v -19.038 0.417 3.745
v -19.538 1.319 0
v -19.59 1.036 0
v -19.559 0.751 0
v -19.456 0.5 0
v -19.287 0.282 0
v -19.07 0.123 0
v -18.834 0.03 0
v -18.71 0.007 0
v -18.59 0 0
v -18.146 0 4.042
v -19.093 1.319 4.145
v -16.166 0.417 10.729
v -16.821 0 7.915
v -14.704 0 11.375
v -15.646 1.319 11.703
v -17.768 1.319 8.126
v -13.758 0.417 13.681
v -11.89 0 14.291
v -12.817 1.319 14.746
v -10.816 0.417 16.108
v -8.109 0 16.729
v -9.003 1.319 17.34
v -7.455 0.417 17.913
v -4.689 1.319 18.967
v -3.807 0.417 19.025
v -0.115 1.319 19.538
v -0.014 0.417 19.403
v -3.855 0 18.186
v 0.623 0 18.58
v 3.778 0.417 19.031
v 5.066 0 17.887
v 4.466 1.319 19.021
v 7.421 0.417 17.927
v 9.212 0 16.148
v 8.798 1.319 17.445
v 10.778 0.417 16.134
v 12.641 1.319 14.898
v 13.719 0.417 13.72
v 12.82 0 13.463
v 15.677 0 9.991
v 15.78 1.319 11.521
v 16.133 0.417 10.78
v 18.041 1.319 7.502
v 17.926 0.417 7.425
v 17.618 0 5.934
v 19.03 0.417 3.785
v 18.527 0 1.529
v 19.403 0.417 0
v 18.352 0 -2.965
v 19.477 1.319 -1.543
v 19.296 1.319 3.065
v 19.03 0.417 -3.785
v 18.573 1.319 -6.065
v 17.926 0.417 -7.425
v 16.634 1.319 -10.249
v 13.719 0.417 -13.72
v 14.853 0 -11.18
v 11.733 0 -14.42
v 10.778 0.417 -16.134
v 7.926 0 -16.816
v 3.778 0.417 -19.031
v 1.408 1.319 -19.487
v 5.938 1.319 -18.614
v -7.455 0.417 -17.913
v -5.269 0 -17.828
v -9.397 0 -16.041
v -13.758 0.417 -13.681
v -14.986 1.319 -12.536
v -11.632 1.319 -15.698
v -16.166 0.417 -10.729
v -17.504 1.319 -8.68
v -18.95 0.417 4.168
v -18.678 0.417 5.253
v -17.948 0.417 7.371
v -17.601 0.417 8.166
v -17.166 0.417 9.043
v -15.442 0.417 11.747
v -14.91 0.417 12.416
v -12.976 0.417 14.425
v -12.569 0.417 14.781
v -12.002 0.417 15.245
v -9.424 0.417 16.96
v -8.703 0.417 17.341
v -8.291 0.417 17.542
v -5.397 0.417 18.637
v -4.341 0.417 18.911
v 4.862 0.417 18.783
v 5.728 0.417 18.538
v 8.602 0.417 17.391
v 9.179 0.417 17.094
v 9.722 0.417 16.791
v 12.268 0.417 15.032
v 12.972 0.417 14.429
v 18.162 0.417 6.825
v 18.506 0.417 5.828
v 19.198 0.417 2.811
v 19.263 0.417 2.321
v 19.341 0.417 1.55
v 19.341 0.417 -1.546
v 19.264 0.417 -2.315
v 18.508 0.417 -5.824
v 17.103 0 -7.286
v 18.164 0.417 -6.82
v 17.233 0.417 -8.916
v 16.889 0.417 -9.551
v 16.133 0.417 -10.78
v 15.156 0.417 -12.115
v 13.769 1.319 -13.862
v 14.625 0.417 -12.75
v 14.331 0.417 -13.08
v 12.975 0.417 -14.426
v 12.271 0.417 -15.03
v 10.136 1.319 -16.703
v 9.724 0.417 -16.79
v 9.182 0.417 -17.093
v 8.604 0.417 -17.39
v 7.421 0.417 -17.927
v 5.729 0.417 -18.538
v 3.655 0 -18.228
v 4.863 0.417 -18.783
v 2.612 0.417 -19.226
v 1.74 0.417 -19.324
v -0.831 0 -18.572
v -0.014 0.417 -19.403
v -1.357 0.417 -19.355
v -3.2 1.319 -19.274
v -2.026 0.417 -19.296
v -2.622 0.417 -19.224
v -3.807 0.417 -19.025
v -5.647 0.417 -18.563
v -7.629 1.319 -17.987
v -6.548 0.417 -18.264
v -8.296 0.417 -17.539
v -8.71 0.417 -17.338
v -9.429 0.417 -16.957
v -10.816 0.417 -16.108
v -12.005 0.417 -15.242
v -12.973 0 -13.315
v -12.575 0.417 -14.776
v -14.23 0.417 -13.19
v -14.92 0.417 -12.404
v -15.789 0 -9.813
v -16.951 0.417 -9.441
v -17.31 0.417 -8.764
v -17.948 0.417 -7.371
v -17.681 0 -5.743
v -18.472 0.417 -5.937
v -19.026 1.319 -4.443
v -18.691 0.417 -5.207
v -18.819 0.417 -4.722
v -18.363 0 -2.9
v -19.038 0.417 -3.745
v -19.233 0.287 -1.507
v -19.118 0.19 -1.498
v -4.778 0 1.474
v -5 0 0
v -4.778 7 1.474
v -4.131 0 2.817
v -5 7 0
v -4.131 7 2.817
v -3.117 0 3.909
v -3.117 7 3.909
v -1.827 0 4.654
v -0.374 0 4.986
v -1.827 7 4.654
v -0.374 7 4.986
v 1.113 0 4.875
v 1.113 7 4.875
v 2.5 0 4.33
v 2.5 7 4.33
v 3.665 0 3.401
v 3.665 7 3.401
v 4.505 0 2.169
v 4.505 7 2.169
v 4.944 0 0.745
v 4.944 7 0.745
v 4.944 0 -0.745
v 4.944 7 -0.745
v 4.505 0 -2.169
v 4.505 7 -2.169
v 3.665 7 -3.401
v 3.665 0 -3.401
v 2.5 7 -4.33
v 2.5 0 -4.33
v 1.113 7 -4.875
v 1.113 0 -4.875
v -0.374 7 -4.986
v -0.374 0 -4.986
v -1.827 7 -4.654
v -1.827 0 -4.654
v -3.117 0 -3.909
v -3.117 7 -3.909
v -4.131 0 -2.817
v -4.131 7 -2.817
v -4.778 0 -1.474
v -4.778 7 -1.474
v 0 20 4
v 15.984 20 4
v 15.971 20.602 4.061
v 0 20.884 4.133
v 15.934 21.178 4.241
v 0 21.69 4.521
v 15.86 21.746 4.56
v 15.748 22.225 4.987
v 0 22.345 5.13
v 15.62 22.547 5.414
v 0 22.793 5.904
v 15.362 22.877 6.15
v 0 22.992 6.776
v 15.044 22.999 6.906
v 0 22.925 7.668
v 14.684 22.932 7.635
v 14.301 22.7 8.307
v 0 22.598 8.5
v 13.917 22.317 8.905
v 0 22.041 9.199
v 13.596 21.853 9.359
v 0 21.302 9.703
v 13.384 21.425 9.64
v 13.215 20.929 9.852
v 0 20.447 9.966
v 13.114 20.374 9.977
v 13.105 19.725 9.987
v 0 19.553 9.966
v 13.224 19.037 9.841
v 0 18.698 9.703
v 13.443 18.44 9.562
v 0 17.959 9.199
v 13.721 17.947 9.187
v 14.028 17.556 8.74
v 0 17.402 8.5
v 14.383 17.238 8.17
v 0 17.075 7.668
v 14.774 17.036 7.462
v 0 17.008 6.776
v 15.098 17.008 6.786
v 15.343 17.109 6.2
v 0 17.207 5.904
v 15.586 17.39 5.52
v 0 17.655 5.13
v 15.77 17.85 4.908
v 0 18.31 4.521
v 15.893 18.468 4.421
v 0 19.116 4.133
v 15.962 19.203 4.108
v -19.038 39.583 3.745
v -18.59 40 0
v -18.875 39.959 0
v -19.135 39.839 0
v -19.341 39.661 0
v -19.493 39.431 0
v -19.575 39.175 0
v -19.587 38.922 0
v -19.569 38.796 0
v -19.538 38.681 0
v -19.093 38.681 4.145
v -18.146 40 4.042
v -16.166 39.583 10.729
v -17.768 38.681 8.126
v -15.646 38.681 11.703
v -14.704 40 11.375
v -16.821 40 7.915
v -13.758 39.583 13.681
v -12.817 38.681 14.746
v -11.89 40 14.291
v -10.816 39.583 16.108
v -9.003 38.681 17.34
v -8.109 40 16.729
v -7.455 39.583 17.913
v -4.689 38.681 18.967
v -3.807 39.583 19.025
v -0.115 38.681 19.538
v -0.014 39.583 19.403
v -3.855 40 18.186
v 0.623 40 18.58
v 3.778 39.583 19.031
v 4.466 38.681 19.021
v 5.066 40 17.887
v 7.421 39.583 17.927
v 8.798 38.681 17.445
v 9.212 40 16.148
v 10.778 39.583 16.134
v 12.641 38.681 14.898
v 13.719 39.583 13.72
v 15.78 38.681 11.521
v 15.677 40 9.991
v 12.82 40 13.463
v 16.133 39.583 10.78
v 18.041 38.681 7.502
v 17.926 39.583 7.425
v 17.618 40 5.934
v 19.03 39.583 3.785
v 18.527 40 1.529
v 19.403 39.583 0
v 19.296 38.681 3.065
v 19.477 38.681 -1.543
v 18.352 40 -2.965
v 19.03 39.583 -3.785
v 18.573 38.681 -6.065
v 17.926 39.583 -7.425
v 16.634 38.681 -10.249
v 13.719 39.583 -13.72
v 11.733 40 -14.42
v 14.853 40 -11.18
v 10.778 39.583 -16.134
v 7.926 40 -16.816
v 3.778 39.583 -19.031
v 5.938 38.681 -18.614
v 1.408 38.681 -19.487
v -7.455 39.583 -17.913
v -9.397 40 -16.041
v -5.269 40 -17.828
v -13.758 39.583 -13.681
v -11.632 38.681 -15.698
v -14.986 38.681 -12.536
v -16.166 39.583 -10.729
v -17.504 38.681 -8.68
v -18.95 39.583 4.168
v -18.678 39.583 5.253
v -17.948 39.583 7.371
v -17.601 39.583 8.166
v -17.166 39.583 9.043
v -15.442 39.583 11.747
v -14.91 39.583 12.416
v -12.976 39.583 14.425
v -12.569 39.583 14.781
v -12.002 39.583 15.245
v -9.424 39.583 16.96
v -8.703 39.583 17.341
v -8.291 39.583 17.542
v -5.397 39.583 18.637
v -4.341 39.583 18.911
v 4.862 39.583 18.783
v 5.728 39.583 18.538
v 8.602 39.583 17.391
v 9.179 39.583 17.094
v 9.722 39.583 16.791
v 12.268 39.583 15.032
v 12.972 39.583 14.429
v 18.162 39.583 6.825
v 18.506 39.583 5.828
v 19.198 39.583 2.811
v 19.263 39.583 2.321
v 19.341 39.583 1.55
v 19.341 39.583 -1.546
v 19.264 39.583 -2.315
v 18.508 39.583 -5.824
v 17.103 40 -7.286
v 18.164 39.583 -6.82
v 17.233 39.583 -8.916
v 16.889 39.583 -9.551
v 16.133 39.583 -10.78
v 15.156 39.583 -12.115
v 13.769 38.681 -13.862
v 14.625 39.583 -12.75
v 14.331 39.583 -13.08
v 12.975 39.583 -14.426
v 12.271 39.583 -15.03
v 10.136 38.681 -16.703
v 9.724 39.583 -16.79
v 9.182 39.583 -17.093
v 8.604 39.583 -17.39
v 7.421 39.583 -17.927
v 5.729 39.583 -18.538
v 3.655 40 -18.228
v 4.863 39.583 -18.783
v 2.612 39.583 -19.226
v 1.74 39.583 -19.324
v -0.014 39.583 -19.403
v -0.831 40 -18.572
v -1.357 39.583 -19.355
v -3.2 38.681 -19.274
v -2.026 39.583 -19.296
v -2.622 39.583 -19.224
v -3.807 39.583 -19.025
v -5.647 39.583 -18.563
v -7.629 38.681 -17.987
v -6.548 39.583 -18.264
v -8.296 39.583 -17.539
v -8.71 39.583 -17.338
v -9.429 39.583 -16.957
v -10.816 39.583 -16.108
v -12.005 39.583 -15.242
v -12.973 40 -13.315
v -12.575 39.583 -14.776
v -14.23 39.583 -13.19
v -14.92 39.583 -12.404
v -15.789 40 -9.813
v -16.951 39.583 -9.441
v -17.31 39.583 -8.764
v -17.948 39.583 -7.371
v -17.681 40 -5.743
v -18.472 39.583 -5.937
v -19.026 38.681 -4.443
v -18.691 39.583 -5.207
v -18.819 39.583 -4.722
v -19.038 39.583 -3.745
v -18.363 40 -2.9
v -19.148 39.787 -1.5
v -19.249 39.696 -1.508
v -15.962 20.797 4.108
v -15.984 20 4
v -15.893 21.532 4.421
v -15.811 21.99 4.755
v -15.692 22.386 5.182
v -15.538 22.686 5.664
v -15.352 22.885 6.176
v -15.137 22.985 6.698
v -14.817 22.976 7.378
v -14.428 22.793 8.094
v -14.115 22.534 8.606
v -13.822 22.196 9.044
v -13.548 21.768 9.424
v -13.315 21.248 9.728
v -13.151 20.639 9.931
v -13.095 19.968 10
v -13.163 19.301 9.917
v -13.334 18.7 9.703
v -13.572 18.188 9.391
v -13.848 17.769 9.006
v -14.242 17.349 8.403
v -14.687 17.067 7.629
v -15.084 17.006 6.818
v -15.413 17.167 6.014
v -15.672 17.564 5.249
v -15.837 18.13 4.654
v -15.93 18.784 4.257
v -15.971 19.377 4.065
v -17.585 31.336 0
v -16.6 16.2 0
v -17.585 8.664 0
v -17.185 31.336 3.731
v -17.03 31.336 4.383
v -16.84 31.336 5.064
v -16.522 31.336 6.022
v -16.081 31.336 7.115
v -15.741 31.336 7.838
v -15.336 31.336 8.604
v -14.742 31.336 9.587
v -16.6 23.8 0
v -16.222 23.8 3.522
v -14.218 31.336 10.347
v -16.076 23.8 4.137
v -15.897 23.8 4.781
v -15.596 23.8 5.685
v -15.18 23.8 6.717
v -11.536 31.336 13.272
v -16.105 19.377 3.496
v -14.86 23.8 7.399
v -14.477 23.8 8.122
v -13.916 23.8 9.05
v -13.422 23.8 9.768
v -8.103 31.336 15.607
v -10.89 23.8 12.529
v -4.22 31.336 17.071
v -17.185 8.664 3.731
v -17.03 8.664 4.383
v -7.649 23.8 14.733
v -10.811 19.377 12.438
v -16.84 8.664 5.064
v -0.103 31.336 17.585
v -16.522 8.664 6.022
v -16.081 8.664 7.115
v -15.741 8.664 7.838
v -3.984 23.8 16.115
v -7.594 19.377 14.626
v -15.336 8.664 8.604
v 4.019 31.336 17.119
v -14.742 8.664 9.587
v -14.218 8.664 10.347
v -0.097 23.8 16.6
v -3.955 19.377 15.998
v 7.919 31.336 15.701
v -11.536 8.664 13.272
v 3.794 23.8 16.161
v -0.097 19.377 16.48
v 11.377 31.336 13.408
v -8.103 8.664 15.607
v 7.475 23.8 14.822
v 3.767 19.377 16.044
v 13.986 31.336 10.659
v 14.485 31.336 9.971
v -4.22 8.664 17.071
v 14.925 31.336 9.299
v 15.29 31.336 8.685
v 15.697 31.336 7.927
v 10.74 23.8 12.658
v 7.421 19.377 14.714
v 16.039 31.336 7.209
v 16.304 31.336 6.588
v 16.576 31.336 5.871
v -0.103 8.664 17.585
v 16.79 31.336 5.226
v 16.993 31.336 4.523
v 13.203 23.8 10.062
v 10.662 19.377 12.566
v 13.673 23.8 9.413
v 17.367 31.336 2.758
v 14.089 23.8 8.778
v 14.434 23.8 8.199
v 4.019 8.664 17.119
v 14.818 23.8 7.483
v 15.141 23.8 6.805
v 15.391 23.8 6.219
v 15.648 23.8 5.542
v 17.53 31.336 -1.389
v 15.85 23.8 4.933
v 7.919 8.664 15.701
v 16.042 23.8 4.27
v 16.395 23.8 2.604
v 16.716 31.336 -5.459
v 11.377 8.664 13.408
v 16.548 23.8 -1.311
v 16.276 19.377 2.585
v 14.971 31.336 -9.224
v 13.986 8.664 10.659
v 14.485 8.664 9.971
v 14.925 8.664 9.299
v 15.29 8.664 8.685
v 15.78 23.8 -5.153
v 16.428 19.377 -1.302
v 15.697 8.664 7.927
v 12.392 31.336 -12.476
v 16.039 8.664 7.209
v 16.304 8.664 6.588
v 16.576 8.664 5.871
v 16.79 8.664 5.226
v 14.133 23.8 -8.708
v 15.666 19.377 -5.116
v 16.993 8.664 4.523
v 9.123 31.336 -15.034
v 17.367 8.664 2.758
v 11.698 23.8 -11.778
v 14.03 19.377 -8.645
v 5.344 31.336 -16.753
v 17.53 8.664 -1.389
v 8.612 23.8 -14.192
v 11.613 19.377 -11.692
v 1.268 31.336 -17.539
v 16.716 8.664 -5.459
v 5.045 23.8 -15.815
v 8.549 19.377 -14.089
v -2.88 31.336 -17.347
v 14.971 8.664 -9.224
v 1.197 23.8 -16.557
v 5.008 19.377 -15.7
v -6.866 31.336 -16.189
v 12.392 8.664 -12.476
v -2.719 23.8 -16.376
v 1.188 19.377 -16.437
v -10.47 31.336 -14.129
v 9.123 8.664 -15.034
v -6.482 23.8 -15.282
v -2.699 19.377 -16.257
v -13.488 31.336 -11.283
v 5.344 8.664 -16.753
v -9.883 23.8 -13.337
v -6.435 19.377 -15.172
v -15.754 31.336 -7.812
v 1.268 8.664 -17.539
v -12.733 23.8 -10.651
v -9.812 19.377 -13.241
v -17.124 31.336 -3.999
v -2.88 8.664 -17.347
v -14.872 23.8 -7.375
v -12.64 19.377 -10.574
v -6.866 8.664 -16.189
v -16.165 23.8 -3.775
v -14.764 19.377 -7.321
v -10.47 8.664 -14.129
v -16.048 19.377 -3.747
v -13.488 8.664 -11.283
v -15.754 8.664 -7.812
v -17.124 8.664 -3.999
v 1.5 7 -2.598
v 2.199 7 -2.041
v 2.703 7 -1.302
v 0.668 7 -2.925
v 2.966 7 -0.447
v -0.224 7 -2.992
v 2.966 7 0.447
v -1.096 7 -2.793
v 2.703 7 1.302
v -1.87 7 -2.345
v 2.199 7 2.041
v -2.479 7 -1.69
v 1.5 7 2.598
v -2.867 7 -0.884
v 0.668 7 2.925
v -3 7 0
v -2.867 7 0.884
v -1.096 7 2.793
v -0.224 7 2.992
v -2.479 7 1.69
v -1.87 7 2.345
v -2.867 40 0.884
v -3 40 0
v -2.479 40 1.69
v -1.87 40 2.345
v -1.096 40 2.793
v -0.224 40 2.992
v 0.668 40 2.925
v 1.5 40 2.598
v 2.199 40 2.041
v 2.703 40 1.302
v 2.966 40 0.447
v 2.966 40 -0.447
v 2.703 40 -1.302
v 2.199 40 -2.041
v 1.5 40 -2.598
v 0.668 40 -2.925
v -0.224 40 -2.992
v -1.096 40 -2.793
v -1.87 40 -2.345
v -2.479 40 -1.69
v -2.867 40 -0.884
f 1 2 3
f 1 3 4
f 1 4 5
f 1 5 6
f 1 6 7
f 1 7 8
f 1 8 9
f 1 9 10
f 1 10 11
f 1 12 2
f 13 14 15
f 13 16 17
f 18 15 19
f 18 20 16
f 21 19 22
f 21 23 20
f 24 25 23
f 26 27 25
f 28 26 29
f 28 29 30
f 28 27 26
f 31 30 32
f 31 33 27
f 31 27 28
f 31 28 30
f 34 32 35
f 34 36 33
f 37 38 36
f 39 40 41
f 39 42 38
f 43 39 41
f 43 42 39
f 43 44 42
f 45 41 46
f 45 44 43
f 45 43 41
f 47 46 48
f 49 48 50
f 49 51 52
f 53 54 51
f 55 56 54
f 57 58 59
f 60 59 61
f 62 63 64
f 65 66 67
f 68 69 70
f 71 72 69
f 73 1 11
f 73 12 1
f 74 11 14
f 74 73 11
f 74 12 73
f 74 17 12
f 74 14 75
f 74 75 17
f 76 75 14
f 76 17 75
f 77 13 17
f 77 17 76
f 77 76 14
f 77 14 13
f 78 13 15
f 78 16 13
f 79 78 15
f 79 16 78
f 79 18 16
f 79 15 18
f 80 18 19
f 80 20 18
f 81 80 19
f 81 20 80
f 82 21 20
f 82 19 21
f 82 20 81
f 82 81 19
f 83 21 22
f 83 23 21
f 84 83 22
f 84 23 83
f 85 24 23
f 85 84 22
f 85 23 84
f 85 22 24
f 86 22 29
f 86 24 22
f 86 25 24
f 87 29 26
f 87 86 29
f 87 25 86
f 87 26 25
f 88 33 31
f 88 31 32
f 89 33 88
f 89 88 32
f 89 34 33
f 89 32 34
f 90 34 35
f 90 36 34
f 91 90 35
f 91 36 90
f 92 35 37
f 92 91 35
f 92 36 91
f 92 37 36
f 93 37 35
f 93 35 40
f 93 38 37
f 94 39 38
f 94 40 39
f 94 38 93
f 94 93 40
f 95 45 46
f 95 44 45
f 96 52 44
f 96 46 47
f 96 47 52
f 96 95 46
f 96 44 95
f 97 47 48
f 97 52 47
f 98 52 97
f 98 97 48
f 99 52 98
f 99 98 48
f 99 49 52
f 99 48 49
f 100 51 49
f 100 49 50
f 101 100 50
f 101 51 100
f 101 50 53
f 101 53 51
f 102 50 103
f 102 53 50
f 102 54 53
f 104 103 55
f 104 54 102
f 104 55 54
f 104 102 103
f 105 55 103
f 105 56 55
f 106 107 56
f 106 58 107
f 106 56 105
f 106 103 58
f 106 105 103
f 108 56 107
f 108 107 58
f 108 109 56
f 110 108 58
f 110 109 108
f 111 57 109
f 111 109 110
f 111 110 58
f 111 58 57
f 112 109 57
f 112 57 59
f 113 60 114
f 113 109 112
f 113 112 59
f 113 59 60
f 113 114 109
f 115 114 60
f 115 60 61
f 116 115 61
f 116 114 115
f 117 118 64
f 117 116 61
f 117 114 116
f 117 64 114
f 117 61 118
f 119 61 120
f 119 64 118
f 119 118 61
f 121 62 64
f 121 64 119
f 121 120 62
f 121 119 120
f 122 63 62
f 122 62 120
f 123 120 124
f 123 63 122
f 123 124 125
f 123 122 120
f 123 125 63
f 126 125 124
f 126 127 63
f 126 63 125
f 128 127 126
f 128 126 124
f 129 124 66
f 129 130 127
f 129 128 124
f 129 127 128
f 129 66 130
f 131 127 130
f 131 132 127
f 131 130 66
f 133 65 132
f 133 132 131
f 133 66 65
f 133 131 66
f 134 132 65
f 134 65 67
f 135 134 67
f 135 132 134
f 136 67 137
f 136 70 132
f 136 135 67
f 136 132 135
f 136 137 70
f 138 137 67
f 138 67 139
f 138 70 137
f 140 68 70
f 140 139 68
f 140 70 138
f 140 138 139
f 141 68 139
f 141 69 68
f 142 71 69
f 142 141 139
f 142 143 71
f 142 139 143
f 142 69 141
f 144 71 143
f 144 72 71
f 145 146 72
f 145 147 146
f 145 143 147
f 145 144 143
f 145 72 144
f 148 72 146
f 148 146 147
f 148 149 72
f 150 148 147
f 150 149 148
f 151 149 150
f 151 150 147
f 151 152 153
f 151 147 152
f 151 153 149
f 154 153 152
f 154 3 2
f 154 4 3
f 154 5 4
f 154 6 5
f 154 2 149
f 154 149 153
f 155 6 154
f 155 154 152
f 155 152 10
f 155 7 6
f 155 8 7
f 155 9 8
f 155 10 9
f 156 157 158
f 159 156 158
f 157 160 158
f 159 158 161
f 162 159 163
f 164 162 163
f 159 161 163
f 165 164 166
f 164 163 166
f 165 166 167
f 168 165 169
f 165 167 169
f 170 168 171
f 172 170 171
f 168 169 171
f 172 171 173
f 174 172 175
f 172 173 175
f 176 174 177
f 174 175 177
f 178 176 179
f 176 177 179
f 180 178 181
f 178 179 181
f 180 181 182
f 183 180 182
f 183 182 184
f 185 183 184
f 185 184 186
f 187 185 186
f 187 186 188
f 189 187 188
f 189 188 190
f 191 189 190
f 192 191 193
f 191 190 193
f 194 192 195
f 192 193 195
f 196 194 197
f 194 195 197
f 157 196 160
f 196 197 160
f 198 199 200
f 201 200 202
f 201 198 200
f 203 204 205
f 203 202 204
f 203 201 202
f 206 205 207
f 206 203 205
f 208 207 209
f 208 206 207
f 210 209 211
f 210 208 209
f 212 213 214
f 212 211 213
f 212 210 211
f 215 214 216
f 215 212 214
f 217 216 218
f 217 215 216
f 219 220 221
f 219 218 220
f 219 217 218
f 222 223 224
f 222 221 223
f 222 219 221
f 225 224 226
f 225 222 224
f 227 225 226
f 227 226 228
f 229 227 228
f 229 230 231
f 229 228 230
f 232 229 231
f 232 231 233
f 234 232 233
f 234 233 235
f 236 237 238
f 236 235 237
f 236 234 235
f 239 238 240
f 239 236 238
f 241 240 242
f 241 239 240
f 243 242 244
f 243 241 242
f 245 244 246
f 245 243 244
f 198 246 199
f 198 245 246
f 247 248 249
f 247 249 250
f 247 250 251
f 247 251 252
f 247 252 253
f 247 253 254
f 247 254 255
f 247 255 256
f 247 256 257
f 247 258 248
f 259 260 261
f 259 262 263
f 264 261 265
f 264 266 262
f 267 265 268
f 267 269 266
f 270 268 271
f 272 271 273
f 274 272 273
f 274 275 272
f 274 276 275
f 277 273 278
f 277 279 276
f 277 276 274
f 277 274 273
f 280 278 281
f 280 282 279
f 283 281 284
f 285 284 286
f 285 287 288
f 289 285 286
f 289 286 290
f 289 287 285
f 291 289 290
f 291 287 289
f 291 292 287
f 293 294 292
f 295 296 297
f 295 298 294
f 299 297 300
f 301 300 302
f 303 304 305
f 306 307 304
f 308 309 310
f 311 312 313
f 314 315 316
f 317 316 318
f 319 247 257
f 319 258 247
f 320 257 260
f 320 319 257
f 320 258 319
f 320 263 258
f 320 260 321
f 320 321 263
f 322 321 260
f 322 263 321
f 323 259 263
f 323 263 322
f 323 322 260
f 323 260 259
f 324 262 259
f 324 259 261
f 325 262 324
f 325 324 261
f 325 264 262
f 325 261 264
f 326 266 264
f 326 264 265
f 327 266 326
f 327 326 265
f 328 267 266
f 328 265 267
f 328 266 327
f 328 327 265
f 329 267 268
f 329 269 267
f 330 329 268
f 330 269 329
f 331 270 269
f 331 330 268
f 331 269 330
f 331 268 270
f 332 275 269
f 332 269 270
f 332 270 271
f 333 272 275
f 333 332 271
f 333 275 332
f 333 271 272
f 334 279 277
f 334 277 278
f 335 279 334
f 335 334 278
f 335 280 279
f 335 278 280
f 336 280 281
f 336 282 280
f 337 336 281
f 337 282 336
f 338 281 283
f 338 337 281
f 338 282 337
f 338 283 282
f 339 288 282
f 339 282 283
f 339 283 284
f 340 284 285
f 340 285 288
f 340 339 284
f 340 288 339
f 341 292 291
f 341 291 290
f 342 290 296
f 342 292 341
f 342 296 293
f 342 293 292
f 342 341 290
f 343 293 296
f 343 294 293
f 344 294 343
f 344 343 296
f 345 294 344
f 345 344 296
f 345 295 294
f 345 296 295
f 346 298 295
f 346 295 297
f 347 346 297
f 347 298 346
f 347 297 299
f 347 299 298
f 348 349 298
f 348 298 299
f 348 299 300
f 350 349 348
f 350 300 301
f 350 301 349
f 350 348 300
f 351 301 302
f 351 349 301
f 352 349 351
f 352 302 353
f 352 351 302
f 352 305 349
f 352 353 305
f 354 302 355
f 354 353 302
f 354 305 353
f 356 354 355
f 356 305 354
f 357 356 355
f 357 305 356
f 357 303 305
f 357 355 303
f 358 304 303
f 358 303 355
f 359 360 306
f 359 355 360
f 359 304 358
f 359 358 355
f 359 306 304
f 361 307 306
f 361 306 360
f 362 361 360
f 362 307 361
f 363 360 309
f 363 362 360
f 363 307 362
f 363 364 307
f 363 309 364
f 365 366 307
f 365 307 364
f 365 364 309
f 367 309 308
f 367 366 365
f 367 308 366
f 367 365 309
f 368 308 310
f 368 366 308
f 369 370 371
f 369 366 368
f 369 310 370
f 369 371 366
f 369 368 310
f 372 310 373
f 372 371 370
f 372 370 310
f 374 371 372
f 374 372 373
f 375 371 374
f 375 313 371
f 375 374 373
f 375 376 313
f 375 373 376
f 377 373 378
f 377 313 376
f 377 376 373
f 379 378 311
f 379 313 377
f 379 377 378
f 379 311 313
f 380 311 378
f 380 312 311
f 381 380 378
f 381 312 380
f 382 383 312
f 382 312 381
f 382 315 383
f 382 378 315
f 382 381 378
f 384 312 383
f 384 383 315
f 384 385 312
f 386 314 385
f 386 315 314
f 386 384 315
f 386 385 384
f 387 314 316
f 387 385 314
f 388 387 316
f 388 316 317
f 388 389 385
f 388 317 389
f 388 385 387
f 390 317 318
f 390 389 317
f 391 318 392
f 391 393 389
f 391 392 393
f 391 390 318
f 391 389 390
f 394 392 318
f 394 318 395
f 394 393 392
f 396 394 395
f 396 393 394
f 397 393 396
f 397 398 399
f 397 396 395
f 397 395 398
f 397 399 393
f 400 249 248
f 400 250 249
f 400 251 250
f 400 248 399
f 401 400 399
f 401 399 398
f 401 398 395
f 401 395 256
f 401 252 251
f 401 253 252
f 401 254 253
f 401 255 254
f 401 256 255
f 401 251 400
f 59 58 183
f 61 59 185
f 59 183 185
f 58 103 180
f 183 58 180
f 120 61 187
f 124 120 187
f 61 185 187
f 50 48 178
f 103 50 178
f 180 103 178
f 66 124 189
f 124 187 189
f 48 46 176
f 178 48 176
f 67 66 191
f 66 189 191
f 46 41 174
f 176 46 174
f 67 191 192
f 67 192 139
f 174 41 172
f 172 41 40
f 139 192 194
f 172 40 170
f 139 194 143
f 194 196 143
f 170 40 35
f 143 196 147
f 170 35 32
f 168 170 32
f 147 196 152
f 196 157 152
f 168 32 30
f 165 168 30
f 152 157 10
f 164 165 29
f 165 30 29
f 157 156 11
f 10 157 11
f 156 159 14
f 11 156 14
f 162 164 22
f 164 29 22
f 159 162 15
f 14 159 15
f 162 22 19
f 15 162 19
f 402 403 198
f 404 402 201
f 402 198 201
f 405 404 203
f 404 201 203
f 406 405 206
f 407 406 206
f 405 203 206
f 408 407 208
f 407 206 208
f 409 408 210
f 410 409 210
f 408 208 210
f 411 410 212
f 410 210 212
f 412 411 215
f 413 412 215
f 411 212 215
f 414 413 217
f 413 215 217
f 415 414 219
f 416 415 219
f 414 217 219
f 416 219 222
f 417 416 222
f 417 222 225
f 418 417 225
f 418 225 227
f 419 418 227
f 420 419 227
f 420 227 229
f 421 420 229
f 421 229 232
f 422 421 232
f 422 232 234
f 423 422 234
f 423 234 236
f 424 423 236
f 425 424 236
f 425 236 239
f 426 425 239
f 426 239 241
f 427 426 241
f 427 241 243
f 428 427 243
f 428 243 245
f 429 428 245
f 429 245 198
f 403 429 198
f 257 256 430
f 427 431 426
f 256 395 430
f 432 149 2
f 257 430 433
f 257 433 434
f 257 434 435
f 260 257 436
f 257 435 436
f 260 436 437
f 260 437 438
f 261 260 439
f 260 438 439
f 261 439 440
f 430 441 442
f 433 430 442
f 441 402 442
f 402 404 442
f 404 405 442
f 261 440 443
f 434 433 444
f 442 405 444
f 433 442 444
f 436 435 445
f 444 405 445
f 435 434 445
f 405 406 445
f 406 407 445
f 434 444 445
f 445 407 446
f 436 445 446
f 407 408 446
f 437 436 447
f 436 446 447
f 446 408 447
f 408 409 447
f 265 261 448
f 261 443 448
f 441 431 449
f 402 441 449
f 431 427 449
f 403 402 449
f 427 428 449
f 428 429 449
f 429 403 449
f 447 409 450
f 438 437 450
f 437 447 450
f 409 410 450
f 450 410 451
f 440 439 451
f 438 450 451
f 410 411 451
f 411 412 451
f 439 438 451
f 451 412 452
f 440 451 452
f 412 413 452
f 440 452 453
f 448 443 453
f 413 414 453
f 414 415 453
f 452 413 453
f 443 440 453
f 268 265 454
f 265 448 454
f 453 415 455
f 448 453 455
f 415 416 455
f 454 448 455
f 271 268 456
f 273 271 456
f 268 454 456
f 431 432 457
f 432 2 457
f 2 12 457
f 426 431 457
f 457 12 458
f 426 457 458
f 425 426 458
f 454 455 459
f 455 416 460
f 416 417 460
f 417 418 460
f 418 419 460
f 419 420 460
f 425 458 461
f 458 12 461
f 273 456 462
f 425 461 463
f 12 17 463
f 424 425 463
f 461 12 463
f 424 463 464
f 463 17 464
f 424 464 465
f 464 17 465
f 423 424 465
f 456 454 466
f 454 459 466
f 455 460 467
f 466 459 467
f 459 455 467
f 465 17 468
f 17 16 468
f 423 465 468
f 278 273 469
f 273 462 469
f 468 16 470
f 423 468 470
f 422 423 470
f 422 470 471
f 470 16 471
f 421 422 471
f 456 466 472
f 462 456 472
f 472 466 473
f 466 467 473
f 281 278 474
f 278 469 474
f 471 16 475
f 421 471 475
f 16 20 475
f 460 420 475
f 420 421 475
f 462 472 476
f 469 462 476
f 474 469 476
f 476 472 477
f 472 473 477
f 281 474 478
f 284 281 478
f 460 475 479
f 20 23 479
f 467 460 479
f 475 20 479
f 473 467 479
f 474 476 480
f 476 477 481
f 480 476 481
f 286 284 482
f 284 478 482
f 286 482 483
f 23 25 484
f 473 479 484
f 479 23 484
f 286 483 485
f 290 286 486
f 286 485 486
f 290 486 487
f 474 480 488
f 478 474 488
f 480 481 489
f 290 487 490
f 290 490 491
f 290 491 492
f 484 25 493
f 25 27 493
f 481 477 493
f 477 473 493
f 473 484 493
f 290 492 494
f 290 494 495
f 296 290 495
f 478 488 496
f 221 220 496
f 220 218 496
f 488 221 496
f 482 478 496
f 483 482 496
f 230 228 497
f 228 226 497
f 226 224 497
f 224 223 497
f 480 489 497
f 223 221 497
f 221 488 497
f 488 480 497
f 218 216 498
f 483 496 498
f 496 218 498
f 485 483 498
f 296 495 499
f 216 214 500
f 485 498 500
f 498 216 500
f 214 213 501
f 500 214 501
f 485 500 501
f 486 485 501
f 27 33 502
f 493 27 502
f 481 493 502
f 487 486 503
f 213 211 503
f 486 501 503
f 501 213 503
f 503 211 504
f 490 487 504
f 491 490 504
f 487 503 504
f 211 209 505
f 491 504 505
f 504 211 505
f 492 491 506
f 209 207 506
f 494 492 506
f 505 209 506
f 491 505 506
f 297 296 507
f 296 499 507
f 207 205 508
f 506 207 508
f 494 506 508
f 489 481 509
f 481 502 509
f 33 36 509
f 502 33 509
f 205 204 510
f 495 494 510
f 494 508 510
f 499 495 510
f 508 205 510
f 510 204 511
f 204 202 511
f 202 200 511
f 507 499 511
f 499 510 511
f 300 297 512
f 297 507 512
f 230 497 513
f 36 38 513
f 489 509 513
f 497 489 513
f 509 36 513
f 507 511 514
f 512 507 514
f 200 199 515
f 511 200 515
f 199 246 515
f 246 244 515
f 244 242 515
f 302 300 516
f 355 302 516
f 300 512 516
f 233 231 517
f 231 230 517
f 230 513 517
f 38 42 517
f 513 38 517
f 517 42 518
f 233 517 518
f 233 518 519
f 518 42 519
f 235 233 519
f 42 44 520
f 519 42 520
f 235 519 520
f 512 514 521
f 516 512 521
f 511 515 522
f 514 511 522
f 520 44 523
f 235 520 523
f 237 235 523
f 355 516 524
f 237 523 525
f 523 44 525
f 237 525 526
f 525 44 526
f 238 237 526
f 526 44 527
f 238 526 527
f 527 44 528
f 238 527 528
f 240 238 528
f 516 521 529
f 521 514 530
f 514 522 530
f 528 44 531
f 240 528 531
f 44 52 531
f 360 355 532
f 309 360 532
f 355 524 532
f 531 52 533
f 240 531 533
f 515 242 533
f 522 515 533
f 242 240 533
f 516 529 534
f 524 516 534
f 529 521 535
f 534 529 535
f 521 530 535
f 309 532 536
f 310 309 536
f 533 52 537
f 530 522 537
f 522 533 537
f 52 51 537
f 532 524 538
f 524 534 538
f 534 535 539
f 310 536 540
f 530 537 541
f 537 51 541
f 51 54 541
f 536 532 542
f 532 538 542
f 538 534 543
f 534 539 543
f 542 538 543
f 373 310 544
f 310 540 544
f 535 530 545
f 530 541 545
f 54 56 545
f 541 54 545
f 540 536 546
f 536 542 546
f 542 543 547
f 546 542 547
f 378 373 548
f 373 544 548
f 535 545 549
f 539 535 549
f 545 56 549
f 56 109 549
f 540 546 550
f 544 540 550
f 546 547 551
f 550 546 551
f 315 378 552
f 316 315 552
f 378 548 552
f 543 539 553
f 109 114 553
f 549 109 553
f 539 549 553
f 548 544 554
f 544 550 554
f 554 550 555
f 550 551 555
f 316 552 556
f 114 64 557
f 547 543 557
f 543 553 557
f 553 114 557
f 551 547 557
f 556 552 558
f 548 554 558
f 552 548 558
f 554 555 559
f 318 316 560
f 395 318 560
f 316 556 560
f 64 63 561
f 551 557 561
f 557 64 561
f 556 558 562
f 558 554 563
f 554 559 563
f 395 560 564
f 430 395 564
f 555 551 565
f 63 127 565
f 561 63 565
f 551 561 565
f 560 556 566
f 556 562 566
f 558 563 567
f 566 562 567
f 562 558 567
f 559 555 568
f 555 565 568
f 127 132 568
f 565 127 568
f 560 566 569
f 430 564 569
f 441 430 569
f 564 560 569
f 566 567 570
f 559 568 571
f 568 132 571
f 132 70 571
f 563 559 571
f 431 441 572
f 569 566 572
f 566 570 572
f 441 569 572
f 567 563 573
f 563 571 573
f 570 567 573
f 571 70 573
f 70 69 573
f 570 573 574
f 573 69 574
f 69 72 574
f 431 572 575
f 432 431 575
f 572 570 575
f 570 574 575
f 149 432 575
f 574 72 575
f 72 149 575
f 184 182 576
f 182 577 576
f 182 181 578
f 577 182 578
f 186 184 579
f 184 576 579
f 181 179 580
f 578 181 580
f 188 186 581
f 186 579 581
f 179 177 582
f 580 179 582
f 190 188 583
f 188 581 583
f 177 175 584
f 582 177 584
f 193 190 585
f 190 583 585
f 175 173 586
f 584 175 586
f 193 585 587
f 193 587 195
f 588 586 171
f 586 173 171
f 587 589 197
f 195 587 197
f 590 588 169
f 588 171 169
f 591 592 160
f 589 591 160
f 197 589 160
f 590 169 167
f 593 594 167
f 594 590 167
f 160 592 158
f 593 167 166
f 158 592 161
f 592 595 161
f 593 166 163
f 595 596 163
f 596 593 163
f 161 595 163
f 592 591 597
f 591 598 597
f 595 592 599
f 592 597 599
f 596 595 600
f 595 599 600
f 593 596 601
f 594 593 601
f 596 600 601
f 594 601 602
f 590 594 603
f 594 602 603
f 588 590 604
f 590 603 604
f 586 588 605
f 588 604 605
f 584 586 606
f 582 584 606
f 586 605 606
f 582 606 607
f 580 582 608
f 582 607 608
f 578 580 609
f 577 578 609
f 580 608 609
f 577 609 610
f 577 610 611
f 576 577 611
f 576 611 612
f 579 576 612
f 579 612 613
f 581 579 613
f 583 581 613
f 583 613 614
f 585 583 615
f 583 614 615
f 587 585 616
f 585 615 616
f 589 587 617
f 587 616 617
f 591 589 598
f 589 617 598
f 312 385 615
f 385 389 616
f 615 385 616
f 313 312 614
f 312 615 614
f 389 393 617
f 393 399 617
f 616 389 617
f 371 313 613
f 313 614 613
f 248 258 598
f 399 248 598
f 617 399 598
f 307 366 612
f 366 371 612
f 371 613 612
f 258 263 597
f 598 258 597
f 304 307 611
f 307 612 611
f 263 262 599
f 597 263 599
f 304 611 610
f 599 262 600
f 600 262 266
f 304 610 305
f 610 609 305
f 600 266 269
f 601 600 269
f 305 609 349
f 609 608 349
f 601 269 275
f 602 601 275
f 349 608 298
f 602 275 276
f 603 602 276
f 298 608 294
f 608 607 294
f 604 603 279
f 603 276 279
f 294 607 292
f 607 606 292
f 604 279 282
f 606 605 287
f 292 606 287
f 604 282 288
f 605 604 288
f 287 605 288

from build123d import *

# Parameters (mm, degrees)
CONG_1_R                     = 1
ESQUISSE2_R                  = 3
ENL_V_MAT_EXTRU_1_DEPTH      = 20.590364406
ENL_V_MAT_EXTRU_1_DEPTH_BACK = 20.590364406


with BuildPart() as part:
    # Esquisse1 → Révolution1 (revolve)
    with BuildSketch(Plane.XY):
        with BuildLine():
            Line((-3, 40), (-20, 40))
            ThreePointArc((-20, 40), (-16.476500446, 20), (-20, 0))
            Line((-20, 0), (-5, 0))
            Line((-5, 0), (-5, 7))
            Line((-5, 7), (-3, 7))
            Line((-3, 7), (-3, 40))
        make_face()
    revolve(axis=Axis((0, 0, 0), (0, 1, 0)))

    # Congé1
    cong_1_edges = [part.edges().sort_by_distance(p)[0] for p in [
        (20, 40, 0),
        (20, 0, 0),
    ]]
    fillet(cong_1_edges, radius=CONG_1_R)

    # Esquisse2 → Enlèv. mat.-Extru.1 (cut, two sides)
    with BuildSketch(Plane(origin=(0, 0, 0), x_dir=(0, 0, -1), z_dir=(1, 0, 0))) as enl_v_mat_extru_1_sk:
        with Locations((-7, 20)):
            Circle(ESQUISSE2_R)
    extrude(amount=ENL_V_MAT_EXTRU_1_DEPTH, mode=Mode.SUBTRACT)
    extrude(enl_v_mat_extru_1_sk.sketch, amount=-ENL_V_MAT_EXTRU_1_DEPTH_BACK, mode=Mode.SUBTRACT)


solid = part.part
